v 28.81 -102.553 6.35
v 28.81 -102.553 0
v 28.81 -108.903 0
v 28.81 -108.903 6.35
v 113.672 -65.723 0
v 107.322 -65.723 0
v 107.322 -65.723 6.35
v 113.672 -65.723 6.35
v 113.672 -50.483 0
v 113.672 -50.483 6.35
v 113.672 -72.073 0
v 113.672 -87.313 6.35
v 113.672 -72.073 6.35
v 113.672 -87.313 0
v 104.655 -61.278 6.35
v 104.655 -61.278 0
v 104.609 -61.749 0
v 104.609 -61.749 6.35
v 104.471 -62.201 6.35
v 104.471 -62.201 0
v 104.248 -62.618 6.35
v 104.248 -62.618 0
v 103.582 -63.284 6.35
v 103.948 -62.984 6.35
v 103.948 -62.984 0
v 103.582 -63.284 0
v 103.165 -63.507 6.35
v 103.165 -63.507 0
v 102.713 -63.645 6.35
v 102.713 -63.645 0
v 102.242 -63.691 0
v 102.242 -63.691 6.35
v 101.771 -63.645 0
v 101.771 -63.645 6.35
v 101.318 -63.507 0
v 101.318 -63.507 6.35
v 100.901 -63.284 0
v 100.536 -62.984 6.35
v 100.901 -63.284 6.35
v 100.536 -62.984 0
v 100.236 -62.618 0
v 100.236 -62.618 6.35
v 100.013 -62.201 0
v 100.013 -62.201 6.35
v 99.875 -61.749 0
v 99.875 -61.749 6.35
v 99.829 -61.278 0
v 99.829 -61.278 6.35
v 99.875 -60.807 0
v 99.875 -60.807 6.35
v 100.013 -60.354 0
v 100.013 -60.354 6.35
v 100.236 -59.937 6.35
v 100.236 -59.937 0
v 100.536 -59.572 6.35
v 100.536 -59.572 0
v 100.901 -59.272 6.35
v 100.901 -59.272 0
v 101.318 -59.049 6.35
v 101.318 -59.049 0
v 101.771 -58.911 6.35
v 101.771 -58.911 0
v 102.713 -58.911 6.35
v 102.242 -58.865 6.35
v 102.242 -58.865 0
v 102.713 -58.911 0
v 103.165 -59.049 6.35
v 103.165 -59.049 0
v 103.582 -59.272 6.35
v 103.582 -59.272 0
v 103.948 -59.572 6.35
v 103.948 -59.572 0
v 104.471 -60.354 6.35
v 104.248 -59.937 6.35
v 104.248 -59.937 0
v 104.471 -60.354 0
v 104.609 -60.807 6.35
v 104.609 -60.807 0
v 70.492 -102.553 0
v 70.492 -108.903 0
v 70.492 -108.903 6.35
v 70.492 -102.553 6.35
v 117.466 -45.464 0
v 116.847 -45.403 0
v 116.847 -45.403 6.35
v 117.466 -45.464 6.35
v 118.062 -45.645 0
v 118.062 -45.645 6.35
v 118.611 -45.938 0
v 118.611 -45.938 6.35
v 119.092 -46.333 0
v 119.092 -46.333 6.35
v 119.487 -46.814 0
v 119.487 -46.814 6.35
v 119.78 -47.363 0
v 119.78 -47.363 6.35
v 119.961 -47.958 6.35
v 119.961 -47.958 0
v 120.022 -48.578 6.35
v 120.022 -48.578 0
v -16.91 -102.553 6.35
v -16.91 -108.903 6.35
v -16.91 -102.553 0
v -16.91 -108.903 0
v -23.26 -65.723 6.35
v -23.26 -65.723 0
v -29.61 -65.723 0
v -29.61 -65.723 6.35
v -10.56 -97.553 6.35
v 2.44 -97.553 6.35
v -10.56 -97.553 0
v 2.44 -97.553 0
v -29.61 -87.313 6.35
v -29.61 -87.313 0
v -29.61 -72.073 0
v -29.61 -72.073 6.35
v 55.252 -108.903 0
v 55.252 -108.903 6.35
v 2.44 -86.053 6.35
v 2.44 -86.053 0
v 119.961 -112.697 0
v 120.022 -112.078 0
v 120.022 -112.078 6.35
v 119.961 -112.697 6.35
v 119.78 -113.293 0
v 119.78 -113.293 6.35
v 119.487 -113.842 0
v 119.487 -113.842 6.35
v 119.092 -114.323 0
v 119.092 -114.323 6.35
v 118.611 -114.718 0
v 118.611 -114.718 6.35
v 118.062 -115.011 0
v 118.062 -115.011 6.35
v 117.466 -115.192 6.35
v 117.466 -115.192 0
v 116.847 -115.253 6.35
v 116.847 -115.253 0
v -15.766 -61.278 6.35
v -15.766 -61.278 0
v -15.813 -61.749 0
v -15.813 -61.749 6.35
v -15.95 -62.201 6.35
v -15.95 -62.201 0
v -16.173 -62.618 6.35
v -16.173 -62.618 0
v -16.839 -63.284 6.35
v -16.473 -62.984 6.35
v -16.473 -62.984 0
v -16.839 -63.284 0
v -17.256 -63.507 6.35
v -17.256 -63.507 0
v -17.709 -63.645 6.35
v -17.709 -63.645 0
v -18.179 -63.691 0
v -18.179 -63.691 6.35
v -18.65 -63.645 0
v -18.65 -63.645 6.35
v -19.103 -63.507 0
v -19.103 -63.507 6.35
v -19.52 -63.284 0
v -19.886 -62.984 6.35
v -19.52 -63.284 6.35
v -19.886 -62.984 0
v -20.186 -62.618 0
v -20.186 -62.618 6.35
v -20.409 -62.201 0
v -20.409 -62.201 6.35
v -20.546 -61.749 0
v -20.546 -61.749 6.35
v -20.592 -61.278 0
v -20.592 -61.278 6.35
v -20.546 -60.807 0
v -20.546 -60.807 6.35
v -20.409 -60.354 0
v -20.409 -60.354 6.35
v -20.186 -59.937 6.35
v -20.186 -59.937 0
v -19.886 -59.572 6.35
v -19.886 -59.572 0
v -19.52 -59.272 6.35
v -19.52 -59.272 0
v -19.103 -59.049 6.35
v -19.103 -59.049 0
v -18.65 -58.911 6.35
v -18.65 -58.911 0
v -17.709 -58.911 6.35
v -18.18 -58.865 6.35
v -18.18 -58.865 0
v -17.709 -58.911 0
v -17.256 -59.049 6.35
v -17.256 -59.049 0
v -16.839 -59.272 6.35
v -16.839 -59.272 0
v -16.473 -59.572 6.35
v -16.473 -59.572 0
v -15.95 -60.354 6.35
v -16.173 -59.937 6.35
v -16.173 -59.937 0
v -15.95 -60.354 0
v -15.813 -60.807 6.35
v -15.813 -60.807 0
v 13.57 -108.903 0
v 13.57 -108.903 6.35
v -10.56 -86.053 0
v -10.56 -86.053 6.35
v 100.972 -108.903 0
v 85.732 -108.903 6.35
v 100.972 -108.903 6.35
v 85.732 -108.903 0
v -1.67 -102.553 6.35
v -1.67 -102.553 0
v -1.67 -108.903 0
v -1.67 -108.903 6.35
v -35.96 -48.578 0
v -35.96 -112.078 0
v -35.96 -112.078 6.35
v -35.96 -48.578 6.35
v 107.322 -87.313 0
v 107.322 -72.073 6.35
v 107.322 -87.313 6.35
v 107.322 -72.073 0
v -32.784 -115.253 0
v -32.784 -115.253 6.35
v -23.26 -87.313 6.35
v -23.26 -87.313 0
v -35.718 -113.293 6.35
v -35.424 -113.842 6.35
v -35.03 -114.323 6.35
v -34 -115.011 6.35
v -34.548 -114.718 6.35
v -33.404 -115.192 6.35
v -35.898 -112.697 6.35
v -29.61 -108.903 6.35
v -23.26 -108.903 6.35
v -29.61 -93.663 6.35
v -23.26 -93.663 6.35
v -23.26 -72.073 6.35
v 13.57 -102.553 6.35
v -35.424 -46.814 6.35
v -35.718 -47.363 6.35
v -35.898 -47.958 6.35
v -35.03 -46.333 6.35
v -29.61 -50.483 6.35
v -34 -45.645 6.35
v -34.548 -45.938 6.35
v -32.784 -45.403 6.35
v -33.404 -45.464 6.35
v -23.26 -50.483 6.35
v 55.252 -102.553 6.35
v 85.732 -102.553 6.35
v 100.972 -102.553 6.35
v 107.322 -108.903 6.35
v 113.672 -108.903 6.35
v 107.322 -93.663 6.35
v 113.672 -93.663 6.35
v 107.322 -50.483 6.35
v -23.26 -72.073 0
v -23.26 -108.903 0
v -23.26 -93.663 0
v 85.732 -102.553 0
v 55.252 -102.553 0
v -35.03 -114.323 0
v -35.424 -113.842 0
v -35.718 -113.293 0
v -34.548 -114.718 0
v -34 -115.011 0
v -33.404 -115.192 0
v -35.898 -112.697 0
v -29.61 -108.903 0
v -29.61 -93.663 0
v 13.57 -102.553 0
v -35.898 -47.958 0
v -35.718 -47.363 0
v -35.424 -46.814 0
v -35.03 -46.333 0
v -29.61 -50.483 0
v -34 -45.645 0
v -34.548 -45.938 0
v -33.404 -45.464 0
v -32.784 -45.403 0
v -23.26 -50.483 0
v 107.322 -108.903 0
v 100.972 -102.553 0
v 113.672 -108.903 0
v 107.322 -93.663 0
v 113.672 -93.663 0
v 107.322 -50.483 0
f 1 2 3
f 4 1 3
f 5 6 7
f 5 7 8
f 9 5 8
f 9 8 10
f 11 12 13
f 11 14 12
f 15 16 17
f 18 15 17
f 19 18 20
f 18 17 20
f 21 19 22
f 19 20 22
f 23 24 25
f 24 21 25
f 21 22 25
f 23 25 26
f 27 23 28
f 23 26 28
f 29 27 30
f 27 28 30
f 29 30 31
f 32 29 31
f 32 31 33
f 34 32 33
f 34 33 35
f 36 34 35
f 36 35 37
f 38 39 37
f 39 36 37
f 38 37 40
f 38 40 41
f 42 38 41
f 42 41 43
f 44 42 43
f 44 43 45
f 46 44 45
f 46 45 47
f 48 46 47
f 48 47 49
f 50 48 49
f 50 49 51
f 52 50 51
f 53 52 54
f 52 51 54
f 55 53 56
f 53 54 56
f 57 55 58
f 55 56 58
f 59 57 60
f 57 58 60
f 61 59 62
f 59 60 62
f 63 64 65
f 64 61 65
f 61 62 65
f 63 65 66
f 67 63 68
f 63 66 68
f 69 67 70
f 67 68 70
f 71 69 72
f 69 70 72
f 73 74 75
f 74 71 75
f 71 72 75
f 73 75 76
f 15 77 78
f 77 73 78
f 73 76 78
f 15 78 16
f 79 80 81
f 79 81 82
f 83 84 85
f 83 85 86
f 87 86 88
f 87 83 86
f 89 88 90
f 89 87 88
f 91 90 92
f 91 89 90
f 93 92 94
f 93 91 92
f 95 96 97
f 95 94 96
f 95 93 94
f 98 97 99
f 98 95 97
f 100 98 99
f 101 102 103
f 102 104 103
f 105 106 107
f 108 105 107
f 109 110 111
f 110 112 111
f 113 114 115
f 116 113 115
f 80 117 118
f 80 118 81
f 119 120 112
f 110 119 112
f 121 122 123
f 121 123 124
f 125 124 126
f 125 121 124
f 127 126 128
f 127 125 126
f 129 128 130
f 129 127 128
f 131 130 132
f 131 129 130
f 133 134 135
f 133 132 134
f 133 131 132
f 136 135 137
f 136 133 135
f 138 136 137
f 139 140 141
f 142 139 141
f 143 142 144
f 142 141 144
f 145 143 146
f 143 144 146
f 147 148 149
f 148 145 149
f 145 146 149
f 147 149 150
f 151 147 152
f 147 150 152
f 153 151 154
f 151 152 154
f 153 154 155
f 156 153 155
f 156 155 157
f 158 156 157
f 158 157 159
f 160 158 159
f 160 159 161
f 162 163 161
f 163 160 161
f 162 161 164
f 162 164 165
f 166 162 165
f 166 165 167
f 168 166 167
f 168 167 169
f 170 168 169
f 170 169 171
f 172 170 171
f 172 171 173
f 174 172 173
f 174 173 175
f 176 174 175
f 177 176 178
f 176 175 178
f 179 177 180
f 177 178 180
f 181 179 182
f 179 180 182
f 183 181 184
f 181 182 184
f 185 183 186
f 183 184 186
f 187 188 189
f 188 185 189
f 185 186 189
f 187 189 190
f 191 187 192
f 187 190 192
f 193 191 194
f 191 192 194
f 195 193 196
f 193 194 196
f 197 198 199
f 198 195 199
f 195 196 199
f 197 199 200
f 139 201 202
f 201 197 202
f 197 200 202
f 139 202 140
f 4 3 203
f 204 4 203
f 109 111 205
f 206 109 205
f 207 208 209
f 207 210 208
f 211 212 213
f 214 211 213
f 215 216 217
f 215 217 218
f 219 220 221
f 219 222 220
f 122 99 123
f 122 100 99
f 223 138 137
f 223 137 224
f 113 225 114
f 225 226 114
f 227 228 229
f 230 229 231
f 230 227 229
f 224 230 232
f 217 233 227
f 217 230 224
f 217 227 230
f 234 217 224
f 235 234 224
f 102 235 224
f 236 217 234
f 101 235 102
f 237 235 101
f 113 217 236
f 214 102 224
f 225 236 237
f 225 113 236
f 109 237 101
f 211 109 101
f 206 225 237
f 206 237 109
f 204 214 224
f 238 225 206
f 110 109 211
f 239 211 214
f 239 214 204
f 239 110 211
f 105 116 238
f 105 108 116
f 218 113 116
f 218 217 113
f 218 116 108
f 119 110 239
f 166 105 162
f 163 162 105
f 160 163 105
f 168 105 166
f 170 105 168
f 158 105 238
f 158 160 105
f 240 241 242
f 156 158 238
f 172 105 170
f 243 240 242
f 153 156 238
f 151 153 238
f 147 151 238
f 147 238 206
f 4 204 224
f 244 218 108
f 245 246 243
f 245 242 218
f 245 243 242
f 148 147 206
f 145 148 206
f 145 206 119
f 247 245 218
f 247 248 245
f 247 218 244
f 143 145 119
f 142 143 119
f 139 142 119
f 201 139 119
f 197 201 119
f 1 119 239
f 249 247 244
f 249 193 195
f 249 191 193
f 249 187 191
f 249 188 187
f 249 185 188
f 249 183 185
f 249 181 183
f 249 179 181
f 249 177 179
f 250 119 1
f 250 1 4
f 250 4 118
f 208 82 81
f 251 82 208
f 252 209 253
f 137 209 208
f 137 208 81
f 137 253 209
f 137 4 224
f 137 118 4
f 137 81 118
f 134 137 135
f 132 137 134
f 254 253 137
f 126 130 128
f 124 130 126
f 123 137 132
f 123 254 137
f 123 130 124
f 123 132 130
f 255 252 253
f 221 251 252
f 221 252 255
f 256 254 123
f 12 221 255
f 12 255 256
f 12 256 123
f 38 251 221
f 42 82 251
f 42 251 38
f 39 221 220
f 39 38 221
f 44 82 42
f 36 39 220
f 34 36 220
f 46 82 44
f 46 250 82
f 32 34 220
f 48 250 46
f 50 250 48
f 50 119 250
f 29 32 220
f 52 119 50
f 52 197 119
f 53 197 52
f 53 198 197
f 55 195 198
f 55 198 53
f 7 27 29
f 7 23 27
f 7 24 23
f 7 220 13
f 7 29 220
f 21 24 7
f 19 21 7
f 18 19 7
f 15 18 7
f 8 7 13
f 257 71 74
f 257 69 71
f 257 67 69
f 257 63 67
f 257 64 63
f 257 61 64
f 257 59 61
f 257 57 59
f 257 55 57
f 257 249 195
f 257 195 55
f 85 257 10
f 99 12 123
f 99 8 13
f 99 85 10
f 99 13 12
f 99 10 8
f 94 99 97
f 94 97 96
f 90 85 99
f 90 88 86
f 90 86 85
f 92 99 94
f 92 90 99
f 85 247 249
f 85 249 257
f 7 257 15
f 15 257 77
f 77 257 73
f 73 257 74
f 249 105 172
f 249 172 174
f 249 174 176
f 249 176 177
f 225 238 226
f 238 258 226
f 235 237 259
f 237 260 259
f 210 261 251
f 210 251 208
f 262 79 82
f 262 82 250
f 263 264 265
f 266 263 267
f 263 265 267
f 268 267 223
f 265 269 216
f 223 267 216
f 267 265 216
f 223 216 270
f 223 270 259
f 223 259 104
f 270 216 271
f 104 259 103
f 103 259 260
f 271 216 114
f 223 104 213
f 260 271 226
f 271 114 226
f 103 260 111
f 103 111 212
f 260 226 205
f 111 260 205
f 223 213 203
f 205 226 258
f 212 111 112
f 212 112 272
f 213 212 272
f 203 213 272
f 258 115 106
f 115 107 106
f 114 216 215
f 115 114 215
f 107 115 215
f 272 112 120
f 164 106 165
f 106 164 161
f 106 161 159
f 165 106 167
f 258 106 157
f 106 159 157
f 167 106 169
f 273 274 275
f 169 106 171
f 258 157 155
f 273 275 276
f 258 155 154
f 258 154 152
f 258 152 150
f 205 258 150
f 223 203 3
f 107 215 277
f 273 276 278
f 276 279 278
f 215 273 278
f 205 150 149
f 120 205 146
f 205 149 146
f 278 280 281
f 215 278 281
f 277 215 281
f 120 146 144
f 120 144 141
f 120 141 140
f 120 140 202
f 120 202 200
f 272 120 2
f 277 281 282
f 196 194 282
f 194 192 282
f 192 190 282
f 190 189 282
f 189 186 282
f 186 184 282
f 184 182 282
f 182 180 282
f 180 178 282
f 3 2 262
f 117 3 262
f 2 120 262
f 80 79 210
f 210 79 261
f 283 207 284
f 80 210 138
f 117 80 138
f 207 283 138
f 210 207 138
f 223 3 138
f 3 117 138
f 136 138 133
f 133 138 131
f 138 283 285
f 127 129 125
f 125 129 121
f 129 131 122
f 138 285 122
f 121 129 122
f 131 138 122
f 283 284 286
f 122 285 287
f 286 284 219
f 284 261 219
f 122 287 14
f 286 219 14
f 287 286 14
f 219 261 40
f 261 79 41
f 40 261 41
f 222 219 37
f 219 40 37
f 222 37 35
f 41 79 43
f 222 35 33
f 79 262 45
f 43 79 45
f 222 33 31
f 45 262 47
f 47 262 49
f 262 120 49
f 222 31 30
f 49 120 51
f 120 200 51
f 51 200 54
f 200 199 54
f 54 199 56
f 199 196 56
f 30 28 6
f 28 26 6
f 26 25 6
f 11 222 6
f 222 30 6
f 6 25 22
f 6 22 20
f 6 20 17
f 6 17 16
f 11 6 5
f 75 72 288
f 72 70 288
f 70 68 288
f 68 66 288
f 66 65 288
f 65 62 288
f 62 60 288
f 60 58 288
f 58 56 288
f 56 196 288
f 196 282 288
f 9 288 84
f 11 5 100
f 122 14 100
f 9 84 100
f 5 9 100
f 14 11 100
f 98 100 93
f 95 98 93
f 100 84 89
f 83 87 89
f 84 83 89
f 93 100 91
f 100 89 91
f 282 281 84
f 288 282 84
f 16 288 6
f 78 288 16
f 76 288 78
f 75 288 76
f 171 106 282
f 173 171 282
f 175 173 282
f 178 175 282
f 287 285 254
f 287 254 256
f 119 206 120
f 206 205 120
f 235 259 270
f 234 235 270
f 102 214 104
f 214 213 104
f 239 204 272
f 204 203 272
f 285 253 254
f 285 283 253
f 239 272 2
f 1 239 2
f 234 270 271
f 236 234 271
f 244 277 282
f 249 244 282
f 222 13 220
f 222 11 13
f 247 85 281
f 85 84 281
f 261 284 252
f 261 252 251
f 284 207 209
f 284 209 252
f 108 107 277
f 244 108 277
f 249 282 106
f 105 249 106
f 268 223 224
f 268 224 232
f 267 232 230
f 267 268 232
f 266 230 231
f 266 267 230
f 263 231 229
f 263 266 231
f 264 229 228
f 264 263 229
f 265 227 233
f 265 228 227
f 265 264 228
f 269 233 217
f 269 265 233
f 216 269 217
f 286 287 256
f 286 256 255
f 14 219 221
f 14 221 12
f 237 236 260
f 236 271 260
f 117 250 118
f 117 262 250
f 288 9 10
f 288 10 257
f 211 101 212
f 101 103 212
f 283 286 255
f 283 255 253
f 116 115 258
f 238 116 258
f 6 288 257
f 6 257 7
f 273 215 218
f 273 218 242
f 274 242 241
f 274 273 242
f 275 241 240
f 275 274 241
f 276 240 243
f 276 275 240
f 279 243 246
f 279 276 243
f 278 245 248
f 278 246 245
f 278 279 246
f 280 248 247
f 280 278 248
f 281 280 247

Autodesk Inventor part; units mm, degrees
ref_plane "YZ Plane" through (0, 0, 0) normal (1, 0, 0) x (0, 1, 0)
ref_plane "XZ Plane" through (0, 0, 0) normal (0, 1, 0) x (-1, 0, 0)
ref_plane "XY Plane" through (0, 0, 0) normal (0, 0, 1) x (1, 0, 0)
sketch "Sketch1" plane through (0, 0, 0) normal (0, 0, 1) x (1, 0, 0)
  circle A0 centre (-18.1795, -61.2779) radius 2.413
  circle A1 centre (102.2419, -61.2779) radius 2.413
  line L0 (-23.2595, -45.4029) -> (-23.2595, -64.9896) construction
  line L1 (107.3219, -48.5779) -> (107.3219, -70.0812) construction
  line L2 (116.8469, -45.4029) -> (-32.7845, -45.4029)
  line L3 (120.0219, -48.5779) -> (120.0219, -112.0779)
  line L4 (116.8469, -115.2529) -> (-32.7845, -115.2529)
  line L5 (-35.9595, -112.0779) -> (-35.9595, -48.5779)
  arc A2 (-32.7845, -45.4029) -> (-35.9595, -48.5779) centre (-32.7845, -48.5779) ccw
  arc A3 (-35.9595, -112.0779) -> (-32.7845, -115.2529) centre (-32.7845, -112.0779) ccw
  arc A4 (116.8469, -115.2529) -> (120.0219, -112.0779) centre (116.8469, -112.0779) ccw
  arc A5 (120.0219, -48.5779) -> (116.8469, -45.4029) centre (116.8469, -48.5779) ccw
  line L6 (-29.6095, -50.4829) -> (-23.2595, -50.4829)
  line L7 (-23.2595, -50.4829) -> (-23.2595, -65.7229)
  line L8 (-23.2595, -65.7229) -> (-29.6095, -65.7229)
  line L9 (-29.6095, -65.7229) -> (-29.6095, -50.4829)
  line L10 (-29.6095, -72.0729) -> (-23.2595, -72.0729)
  line L11 (-23.2595, -72.0729) -> (-23.2595, -87.3129)
  line L12 (-23.2595, -87.3129) -> (-29.6095, -87.3129)
  line L13 (-29.6095, -87.3129) -> (-29.6095, -72.0729)
  line L14 (-29.6095, -93.6629) -> (-23.2595, -93.6629)
  line L15 (-23.2595, -93.6629) -> (-23.2595, -108.9029)
  line L16 (-23.2595, -108.9029) -> (-29.6095, -108.9029)
  line L17 (-29.6095, -108.9029) -> (-29.6095, -93.6629)
  line L18 (42.0312, -45.4029) -> (42.0312, -115.2529) construction
  line L19 (113.6719, -50.4829) -> (107.3219, -50.4829)
  line L20 (107.3219, -50.4829) -> (107.3219, -65.7229)
  line L21 (107.3219, -65.7229) -> (113.6719, -65.7229)
  line L22 (113.6719, -65.7229) -> (113.6719, -50.4829)
  line L23 (113.6719, -72.0729) -> (107.3219, -72.0729)
  line L24 (107.3219, -72.0729) -> (107.3219, -87.3129)
  line L25 (107.3219, -87.3129) -> (113.6719, -87.3129)
  line L26 (113.6719, -87.3129) -> (113.6719, -72.0729)
  line L27 (113.6719, -93.6629) -> (107.3219, -93.6629)
  line L28 (107.3219, -93.6629) -> (107.3219, -108.9029)
  line L29 (107.3219, -108.9029) -> (113.6719, -108.9029)
  line L30 (113.6719, -108.9029) -> (113.6719, -93.6629)
  line L31 (-16.9095, -102.5529) -> (-1.6695, -102.5529)
  line L32 (-1.6695, -102.5529) -> (-1.6695, -108.9029)
  line L33 (-1.6695, -108.9029) -> (-16.9095, -108.9029)
  line L34 (-16.9095, -108.9029) -> (-16.9095, -102.5529)
  line L35 (13.5705, -102.5529) -> (28.8105, -102.5529)
  line L36 (28.8105, -102.5529) -> (28.8105, -108.9029)
  line L37 (28.8105, -108.9029) -> (13.5705, -108.9029)
  line L38 (13.5705, -108.9029) -> (13.5705, -102.5529)
  line L39 (100.9719, -102.5529) -> (85.7319, -102.5529)
  line L40 (85.7319, -102.5529) -> (85.7319, -108.9029)
  line L41 (85.7319, -108.9029) -> (100.9719, -108.9029)
  line L42 (100.9719, -108.9029) -> (100.9719, -102.5529)
  line L43 (70.4919, -102.5529) -> (55.2519, -102.5529)
  line L44 (55.2519, -102.5529) -> (55.2519, -108.9029)
  line L45 (55.2519, -108.9029) -> (70.4919, -108.9029)
  line L46 (70.4919, -108.9029) -> (70.4919, -102.5529)
  line L47 (-10.5595, -86.0529) -> (2.4405, -86.0529)
  line L48 (2.4405, -86.0529) -> (2.4405, -97.5529)
  line L49 (2.4405, -97.5529) -> (-10.5595, -97.5529)
  line L50 (-10.5595, -97.5529) -> (-10.5595, -86.0529)
  point P0 (0, 0)
  point P1 (-35.9595, -45.4029)
  point P2 (-35.9595, -115.2529)
  point P3 (107.3219, -64.9896)
  dimension "d3" = 4.826
  dimension "d4" = 4.826
  dimension "d7" = 120.4214
  dimension "d8" = 5.08
  dimension "d9" = 5.08
  dimension "d18" = 15.875
  dimension "d19" = 15.875
  dimension "d20" = 90
  dimension "d21" = 12.7
  dimension "d22" = 155.9814
  dimension "d23" = 69.85
  dimension "d24" = 3.175
  dimension "d25" = 6.35
  dimension "d26" = 6.35
  dimension "d27" = 15.24
  dimension "d28" = 15.24
  dimension "d29" = 15.24
  dimension "d30" = 6.35
  dimension "d31" = 6.35
  dimension "d32" = 6.35
  dimension "d37" = 15.24
  dimension "d38" = 15.24
  dimension "d40" = 6.35
  dimension "d41" = 15.24
  dimension "d50" = 6.35
  dimension "d53" = 11.5
  dimension "d54" = 13
  dimension "d55" = 5
  dimension "d56" = 12.7
extrude "Extrusion6" add sketch "Sketch1" along normal blind 6.35
equation "\"d4\" = d3"
equation "\"d19\" = d18"
equation "\"d22\" = 2 * d21 + d7 + d9 + d8"
equation "\"d28\" = d27"
equation "\"d29\" = d27"
equation "\"d31\" = d30"
equation "\"d32\" = d30"
equation "\"d37\" = d27"
equation "\"d38\" = d27"
equation "\"d40\" = d30"
properties part number "Tester Cheek PE" material "UHMW, Black"
